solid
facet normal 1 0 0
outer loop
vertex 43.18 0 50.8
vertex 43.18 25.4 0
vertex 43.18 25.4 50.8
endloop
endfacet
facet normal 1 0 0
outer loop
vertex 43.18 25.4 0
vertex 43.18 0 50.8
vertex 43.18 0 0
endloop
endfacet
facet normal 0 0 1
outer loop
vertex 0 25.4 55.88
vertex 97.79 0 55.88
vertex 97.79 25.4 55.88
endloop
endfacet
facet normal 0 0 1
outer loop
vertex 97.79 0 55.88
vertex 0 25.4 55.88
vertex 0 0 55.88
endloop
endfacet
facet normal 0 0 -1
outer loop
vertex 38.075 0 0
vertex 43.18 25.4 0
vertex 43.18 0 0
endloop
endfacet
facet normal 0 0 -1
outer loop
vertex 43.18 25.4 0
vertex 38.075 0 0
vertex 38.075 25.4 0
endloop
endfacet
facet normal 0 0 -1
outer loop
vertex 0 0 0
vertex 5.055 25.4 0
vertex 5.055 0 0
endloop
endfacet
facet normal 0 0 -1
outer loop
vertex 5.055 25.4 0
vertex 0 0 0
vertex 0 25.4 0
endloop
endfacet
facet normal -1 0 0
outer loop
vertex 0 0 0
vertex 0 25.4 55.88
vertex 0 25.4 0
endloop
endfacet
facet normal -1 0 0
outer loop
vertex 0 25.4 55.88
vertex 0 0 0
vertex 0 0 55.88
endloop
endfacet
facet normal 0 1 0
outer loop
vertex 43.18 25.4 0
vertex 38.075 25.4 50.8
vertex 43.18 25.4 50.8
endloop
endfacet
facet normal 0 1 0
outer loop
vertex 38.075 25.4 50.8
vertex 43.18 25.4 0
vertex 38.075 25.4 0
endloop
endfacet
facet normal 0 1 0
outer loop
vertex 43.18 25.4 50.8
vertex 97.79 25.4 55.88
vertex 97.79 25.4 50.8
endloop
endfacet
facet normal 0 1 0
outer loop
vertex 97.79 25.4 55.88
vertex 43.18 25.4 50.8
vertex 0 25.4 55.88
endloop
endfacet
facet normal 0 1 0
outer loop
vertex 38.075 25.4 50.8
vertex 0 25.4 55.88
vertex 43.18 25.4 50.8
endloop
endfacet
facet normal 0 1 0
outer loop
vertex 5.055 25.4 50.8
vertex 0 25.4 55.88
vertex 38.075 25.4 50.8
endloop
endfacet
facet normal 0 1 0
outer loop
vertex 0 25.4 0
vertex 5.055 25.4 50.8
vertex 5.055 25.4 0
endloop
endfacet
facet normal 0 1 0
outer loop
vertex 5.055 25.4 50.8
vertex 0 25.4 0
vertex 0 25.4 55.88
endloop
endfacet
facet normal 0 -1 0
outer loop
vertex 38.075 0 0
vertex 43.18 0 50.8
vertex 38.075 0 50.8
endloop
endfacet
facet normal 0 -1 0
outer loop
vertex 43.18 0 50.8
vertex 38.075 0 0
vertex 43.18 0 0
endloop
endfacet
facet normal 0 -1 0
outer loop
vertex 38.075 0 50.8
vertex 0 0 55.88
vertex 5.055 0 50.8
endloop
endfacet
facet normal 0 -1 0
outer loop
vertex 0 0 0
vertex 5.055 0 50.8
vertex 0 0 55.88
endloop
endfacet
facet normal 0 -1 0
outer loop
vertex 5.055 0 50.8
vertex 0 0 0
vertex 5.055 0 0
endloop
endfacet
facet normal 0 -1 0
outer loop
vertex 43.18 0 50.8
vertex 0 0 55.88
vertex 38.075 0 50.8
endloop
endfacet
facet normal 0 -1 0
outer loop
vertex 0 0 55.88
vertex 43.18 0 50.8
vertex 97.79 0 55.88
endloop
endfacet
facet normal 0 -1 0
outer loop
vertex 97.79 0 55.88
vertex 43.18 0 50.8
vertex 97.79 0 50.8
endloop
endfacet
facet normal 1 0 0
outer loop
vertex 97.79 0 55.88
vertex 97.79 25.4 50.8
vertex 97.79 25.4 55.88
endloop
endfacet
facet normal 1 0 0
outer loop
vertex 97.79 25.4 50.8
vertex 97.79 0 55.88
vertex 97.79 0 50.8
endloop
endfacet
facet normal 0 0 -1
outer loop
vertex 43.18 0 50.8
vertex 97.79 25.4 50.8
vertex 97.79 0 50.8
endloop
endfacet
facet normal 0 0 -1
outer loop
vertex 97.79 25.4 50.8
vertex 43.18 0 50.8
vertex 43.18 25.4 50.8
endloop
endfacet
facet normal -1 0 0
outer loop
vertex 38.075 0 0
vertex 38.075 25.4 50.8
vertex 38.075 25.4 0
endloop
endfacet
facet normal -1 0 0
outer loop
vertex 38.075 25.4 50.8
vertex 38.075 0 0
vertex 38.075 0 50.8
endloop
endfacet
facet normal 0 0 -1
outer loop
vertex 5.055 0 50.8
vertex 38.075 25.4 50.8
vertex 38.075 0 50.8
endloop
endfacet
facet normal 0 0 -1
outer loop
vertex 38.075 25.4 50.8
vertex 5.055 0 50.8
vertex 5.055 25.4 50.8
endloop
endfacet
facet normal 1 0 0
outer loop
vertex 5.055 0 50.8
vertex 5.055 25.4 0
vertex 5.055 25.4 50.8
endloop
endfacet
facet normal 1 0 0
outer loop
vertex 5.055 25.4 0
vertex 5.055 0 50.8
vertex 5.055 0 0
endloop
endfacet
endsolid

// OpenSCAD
//Sink Middle Bar Extender
//BEGIN CUSTOMIZER VARIABLES
/*[Bar]*/
width_of_bar = 1.3;
thickness = .2;
depth_of_slot = 2;
/*[Extender]*/
length_of_extender = 3;
width_of_extender= 1;
//END CUSTOMIZER VARIABLES
/*[Hidden]*/
unitConversion =25.4;

theThing();

module theThing(){
  difference(){
    union(){
      cube([width_of_bar+thickness*2, width_of_extender,depth_of_slot+thickness]*unitConversion);
      translate([width_of_bar/2+thickness,0,depth_of_slot]*unitConversion){
        cube([length_of_extender,width_of_extender,thickness]*unitConversion);
      }
    }
    translate([thickness-.001,0,0]*unitConversion){
      cube([width_of_bar, width_of_extender+.1, depth_of_slot]*unitConversion);
    }
  }
}
